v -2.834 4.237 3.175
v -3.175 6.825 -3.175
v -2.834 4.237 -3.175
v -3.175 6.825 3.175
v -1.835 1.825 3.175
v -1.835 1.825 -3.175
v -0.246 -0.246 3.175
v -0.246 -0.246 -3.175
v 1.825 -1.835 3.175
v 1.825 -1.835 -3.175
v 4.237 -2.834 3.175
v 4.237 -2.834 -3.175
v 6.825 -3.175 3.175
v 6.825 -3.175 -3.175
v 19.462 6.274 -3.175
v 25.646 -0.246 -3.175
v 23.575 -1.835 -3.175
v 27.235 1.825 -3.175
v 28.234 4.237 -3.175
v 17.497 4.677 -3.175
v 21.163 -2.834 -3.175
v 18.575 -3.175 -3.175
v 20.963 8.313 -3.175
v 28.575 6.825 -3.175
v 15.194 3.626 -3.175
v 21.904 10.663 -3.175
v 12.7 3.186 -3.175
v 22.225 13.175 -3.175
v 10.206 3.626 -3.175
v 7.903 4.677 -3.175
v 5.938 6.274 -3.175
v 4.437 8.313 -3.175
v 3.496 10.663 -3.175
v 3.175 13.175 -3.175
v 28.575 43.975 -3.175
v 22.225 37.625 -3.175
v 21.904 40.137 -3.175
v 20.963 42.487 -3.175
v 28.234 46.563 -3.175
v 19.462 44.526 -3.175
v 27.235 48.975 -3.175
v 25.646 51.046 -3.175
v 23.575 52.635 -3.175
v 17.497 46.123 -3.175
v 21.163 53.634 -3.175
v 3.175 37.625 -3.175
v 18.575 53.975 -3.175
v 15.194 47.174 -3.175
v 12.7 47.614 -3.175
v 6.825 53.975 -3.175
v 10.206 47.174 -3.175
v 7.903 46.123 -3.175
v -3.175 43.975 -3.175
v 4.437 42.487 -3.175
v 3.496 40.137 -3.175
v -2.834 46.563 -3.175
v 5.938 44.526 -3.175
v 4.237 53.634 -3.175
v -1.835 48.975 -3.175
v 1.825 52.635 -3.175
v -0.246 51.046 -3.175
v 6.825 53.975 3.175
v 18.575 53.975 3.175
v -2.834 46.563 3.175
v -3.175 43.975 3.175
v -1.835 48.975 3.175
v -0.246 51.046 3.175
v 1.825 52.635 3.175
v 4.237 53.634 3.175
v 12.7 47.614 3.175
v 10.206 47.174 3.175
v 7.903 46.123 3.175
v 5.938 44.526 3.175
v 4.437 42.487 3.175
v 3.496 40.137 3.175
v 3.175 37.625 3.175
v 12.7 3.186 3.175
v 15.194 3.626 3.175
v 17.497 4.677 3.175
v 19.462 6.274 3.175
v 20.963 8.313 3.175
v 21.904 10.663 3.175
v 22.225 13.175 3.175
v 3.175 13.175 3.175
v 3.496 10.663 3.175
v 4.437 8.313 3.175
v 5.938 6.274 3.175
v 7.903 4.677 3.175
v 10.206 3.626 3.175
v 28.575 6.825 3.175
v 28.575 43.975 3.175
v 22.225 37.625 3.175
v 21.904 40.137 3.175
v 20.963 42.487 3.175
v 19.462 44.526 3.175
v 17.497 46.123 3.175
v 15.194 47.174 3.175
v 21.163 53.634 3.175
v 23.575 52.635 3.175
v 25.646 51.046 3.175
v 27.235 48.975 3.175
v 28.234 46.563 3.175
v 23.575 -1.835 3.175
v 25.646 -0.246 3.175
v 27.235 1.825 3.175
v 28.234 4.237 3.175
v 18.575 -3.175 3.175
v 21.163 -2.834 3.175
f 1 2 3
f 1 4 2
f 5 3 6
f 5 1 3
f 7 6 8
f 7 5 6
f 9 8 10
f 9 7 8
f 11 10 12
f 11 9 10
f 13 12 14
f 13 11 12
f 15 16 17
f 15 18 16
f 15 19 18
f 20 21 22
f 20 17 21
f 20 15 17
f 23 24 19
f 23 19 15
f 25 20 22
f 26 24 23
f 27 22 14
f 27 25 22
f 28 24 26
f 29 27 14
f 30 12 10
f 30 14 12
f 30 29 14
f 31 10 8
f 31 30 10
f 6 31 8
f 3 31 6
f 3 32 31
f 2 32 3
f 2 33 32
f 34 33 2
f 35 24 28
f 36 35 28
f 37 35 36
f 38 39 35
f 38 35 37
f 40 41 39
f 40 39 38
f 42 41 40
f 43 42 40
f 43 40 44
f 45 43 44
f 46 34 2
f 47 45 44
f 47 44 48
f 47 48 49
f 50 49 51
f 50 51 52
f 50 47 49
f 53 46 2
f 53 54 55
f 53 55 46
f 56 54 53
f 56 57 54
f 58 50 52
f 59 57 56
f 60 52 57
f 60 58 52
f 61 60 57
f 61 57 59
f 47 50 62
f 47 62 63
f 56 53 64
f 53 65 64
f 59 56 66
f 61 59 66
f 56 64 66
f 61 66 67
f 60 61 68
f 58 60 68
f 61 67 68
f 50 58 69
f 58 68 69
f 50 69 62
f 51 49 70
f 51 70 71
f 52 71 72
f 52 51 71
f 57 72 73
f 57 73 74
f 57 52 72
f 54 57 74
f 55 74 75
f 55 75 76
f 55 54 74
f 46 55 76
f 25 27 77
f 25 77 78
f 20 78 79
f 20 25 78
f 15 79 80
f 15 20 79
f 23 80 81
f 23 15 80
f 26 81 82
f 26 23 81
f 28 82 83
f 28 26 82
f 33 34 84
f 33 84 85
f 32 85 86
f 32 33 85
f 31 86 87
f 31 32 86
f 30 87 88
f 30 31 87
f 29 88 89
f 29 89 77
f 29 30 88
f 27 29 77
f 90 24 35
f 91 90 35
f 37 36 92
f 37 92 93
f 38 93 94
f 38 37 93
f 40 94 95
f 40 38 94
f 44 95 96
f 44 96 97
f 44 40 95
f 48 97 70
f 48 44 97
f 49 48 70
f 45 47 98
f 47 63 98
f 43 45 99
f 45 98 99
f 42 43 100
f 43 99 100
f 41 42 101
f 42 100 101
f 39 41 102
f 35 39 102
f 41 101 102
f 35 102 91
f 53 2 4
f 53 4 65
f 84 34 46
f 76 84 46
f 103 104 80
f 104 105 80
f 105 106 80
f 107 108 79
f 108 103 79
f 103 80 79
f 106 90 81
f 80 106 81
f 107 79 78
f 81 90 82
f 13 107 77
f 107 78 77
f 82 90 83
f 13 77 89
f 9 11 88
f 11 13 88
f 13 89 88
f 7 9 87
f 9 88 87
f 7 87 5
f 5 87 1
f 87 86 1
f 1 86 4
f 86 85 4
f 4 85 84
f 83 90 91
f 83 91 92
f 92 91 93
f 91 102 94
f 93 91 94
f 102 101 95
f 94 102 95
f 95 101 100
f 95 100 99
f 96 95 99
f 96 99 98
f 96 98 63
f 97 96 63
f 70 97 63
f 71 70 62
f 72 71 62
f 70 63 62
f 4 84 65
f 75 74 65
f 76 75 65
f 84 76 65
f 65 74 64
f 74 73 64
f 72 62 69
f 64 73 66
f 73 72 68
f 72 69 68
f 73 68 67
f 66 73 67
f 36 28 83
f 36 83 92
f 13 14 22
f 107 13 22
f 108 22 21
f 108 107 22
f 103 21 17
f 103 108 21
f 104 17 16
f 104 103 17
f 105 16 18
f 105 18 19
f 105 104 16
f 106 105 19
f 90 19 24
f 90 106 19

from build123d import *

# Parameters (mm, degrees)
SWEEP1_START       = -3.175
SWEEP1_OUTLINE_W   = 31.75
SWEEP1_OUTLINE_H   = 57.15
SWEEP1_OUTLINE_W_2 = 19.05
SWEEP1_OUTLINE_H_2 = 44.45
SWEEP1_DEPTH       = 6.35
FILLET1_R          = 10
FILLET2_R          = 10


# Read off the part's stored shape, not the designer's step: Sweep1
with BuildPart() as part:
    # Sweep1 outline → Sweep1 (new body)
    with BuildSketch(Plane.XY.offset(SWEEP1_START)):
        with Locations((12.7, 25.4)):
            Rectangle(SWEEP1_OUTLINE_W, SWEEP1_OUTLINE_H)
        with Locations((12.7, 25.4)):
            Rectangle(SWEEP1_OUTLINE_W_2, SWEEP1_OUTLINE_H_2, mode=Mode.SUBTRACT)
    extrude(amount=SWEEP1_DEPTH)

    # Fillet1
    # the kernel refuses this fillet: 10 mm, written as the material it adds along each edge
    with BuildSketch(Plane(origin=(3.175, 3.175, -3.175), x_dir=(1, 0, 0), z_dir=(0, 0, 1)), Plane(origin=(22.225, 3.175, -3.175), x_dir=(0, 1, 0), z_dir=(0, 0, 1)), Plane(origin=(22.225, 47.625, -3.175), x_dir=(-1, 0, 0), z_dir=(0, 0, 1))) as fillet1_piece_1:
        with BuildLine():
            CenterArc((FILLET1_R, FILLET1_R), FILLET1_R, 180, 90)
            Line((0, FILLET1_R), (0, 0))
            Line((0, 0), (FILLET1_R, 0))
        make_face()
    extrude(amount=6.35)
    with BuildSketch(Plane(origin=(3.175, 47.625, -3.175), x_dir=(1, 0, 0), z_dir=(0, 0, 1))) as fillet1_piece_2:
        with BuildLine():
            CenterArc((FILLET1_R, -FILLET1_R), FILLET1_R, 90, 90)
            Line((0, -FILLET1_R), (0, 0))
            Line((0, 0), (FILLET1_R, 0))
        make_face()
    extrude(amount=6.35)

    # Fillet2
    fillet2_edges = [part.edges().sort_by_distance(p)[0] for p in [
        (28.575, -3.175, 0),
        (-3.175, 53.975, 0),
        (-3.175, -3.175, 0),
        (28.575, 53.975, 0),
    ]]
    fillet(fillet2_edges, radius=FILLET2_R)


solid = part.part
